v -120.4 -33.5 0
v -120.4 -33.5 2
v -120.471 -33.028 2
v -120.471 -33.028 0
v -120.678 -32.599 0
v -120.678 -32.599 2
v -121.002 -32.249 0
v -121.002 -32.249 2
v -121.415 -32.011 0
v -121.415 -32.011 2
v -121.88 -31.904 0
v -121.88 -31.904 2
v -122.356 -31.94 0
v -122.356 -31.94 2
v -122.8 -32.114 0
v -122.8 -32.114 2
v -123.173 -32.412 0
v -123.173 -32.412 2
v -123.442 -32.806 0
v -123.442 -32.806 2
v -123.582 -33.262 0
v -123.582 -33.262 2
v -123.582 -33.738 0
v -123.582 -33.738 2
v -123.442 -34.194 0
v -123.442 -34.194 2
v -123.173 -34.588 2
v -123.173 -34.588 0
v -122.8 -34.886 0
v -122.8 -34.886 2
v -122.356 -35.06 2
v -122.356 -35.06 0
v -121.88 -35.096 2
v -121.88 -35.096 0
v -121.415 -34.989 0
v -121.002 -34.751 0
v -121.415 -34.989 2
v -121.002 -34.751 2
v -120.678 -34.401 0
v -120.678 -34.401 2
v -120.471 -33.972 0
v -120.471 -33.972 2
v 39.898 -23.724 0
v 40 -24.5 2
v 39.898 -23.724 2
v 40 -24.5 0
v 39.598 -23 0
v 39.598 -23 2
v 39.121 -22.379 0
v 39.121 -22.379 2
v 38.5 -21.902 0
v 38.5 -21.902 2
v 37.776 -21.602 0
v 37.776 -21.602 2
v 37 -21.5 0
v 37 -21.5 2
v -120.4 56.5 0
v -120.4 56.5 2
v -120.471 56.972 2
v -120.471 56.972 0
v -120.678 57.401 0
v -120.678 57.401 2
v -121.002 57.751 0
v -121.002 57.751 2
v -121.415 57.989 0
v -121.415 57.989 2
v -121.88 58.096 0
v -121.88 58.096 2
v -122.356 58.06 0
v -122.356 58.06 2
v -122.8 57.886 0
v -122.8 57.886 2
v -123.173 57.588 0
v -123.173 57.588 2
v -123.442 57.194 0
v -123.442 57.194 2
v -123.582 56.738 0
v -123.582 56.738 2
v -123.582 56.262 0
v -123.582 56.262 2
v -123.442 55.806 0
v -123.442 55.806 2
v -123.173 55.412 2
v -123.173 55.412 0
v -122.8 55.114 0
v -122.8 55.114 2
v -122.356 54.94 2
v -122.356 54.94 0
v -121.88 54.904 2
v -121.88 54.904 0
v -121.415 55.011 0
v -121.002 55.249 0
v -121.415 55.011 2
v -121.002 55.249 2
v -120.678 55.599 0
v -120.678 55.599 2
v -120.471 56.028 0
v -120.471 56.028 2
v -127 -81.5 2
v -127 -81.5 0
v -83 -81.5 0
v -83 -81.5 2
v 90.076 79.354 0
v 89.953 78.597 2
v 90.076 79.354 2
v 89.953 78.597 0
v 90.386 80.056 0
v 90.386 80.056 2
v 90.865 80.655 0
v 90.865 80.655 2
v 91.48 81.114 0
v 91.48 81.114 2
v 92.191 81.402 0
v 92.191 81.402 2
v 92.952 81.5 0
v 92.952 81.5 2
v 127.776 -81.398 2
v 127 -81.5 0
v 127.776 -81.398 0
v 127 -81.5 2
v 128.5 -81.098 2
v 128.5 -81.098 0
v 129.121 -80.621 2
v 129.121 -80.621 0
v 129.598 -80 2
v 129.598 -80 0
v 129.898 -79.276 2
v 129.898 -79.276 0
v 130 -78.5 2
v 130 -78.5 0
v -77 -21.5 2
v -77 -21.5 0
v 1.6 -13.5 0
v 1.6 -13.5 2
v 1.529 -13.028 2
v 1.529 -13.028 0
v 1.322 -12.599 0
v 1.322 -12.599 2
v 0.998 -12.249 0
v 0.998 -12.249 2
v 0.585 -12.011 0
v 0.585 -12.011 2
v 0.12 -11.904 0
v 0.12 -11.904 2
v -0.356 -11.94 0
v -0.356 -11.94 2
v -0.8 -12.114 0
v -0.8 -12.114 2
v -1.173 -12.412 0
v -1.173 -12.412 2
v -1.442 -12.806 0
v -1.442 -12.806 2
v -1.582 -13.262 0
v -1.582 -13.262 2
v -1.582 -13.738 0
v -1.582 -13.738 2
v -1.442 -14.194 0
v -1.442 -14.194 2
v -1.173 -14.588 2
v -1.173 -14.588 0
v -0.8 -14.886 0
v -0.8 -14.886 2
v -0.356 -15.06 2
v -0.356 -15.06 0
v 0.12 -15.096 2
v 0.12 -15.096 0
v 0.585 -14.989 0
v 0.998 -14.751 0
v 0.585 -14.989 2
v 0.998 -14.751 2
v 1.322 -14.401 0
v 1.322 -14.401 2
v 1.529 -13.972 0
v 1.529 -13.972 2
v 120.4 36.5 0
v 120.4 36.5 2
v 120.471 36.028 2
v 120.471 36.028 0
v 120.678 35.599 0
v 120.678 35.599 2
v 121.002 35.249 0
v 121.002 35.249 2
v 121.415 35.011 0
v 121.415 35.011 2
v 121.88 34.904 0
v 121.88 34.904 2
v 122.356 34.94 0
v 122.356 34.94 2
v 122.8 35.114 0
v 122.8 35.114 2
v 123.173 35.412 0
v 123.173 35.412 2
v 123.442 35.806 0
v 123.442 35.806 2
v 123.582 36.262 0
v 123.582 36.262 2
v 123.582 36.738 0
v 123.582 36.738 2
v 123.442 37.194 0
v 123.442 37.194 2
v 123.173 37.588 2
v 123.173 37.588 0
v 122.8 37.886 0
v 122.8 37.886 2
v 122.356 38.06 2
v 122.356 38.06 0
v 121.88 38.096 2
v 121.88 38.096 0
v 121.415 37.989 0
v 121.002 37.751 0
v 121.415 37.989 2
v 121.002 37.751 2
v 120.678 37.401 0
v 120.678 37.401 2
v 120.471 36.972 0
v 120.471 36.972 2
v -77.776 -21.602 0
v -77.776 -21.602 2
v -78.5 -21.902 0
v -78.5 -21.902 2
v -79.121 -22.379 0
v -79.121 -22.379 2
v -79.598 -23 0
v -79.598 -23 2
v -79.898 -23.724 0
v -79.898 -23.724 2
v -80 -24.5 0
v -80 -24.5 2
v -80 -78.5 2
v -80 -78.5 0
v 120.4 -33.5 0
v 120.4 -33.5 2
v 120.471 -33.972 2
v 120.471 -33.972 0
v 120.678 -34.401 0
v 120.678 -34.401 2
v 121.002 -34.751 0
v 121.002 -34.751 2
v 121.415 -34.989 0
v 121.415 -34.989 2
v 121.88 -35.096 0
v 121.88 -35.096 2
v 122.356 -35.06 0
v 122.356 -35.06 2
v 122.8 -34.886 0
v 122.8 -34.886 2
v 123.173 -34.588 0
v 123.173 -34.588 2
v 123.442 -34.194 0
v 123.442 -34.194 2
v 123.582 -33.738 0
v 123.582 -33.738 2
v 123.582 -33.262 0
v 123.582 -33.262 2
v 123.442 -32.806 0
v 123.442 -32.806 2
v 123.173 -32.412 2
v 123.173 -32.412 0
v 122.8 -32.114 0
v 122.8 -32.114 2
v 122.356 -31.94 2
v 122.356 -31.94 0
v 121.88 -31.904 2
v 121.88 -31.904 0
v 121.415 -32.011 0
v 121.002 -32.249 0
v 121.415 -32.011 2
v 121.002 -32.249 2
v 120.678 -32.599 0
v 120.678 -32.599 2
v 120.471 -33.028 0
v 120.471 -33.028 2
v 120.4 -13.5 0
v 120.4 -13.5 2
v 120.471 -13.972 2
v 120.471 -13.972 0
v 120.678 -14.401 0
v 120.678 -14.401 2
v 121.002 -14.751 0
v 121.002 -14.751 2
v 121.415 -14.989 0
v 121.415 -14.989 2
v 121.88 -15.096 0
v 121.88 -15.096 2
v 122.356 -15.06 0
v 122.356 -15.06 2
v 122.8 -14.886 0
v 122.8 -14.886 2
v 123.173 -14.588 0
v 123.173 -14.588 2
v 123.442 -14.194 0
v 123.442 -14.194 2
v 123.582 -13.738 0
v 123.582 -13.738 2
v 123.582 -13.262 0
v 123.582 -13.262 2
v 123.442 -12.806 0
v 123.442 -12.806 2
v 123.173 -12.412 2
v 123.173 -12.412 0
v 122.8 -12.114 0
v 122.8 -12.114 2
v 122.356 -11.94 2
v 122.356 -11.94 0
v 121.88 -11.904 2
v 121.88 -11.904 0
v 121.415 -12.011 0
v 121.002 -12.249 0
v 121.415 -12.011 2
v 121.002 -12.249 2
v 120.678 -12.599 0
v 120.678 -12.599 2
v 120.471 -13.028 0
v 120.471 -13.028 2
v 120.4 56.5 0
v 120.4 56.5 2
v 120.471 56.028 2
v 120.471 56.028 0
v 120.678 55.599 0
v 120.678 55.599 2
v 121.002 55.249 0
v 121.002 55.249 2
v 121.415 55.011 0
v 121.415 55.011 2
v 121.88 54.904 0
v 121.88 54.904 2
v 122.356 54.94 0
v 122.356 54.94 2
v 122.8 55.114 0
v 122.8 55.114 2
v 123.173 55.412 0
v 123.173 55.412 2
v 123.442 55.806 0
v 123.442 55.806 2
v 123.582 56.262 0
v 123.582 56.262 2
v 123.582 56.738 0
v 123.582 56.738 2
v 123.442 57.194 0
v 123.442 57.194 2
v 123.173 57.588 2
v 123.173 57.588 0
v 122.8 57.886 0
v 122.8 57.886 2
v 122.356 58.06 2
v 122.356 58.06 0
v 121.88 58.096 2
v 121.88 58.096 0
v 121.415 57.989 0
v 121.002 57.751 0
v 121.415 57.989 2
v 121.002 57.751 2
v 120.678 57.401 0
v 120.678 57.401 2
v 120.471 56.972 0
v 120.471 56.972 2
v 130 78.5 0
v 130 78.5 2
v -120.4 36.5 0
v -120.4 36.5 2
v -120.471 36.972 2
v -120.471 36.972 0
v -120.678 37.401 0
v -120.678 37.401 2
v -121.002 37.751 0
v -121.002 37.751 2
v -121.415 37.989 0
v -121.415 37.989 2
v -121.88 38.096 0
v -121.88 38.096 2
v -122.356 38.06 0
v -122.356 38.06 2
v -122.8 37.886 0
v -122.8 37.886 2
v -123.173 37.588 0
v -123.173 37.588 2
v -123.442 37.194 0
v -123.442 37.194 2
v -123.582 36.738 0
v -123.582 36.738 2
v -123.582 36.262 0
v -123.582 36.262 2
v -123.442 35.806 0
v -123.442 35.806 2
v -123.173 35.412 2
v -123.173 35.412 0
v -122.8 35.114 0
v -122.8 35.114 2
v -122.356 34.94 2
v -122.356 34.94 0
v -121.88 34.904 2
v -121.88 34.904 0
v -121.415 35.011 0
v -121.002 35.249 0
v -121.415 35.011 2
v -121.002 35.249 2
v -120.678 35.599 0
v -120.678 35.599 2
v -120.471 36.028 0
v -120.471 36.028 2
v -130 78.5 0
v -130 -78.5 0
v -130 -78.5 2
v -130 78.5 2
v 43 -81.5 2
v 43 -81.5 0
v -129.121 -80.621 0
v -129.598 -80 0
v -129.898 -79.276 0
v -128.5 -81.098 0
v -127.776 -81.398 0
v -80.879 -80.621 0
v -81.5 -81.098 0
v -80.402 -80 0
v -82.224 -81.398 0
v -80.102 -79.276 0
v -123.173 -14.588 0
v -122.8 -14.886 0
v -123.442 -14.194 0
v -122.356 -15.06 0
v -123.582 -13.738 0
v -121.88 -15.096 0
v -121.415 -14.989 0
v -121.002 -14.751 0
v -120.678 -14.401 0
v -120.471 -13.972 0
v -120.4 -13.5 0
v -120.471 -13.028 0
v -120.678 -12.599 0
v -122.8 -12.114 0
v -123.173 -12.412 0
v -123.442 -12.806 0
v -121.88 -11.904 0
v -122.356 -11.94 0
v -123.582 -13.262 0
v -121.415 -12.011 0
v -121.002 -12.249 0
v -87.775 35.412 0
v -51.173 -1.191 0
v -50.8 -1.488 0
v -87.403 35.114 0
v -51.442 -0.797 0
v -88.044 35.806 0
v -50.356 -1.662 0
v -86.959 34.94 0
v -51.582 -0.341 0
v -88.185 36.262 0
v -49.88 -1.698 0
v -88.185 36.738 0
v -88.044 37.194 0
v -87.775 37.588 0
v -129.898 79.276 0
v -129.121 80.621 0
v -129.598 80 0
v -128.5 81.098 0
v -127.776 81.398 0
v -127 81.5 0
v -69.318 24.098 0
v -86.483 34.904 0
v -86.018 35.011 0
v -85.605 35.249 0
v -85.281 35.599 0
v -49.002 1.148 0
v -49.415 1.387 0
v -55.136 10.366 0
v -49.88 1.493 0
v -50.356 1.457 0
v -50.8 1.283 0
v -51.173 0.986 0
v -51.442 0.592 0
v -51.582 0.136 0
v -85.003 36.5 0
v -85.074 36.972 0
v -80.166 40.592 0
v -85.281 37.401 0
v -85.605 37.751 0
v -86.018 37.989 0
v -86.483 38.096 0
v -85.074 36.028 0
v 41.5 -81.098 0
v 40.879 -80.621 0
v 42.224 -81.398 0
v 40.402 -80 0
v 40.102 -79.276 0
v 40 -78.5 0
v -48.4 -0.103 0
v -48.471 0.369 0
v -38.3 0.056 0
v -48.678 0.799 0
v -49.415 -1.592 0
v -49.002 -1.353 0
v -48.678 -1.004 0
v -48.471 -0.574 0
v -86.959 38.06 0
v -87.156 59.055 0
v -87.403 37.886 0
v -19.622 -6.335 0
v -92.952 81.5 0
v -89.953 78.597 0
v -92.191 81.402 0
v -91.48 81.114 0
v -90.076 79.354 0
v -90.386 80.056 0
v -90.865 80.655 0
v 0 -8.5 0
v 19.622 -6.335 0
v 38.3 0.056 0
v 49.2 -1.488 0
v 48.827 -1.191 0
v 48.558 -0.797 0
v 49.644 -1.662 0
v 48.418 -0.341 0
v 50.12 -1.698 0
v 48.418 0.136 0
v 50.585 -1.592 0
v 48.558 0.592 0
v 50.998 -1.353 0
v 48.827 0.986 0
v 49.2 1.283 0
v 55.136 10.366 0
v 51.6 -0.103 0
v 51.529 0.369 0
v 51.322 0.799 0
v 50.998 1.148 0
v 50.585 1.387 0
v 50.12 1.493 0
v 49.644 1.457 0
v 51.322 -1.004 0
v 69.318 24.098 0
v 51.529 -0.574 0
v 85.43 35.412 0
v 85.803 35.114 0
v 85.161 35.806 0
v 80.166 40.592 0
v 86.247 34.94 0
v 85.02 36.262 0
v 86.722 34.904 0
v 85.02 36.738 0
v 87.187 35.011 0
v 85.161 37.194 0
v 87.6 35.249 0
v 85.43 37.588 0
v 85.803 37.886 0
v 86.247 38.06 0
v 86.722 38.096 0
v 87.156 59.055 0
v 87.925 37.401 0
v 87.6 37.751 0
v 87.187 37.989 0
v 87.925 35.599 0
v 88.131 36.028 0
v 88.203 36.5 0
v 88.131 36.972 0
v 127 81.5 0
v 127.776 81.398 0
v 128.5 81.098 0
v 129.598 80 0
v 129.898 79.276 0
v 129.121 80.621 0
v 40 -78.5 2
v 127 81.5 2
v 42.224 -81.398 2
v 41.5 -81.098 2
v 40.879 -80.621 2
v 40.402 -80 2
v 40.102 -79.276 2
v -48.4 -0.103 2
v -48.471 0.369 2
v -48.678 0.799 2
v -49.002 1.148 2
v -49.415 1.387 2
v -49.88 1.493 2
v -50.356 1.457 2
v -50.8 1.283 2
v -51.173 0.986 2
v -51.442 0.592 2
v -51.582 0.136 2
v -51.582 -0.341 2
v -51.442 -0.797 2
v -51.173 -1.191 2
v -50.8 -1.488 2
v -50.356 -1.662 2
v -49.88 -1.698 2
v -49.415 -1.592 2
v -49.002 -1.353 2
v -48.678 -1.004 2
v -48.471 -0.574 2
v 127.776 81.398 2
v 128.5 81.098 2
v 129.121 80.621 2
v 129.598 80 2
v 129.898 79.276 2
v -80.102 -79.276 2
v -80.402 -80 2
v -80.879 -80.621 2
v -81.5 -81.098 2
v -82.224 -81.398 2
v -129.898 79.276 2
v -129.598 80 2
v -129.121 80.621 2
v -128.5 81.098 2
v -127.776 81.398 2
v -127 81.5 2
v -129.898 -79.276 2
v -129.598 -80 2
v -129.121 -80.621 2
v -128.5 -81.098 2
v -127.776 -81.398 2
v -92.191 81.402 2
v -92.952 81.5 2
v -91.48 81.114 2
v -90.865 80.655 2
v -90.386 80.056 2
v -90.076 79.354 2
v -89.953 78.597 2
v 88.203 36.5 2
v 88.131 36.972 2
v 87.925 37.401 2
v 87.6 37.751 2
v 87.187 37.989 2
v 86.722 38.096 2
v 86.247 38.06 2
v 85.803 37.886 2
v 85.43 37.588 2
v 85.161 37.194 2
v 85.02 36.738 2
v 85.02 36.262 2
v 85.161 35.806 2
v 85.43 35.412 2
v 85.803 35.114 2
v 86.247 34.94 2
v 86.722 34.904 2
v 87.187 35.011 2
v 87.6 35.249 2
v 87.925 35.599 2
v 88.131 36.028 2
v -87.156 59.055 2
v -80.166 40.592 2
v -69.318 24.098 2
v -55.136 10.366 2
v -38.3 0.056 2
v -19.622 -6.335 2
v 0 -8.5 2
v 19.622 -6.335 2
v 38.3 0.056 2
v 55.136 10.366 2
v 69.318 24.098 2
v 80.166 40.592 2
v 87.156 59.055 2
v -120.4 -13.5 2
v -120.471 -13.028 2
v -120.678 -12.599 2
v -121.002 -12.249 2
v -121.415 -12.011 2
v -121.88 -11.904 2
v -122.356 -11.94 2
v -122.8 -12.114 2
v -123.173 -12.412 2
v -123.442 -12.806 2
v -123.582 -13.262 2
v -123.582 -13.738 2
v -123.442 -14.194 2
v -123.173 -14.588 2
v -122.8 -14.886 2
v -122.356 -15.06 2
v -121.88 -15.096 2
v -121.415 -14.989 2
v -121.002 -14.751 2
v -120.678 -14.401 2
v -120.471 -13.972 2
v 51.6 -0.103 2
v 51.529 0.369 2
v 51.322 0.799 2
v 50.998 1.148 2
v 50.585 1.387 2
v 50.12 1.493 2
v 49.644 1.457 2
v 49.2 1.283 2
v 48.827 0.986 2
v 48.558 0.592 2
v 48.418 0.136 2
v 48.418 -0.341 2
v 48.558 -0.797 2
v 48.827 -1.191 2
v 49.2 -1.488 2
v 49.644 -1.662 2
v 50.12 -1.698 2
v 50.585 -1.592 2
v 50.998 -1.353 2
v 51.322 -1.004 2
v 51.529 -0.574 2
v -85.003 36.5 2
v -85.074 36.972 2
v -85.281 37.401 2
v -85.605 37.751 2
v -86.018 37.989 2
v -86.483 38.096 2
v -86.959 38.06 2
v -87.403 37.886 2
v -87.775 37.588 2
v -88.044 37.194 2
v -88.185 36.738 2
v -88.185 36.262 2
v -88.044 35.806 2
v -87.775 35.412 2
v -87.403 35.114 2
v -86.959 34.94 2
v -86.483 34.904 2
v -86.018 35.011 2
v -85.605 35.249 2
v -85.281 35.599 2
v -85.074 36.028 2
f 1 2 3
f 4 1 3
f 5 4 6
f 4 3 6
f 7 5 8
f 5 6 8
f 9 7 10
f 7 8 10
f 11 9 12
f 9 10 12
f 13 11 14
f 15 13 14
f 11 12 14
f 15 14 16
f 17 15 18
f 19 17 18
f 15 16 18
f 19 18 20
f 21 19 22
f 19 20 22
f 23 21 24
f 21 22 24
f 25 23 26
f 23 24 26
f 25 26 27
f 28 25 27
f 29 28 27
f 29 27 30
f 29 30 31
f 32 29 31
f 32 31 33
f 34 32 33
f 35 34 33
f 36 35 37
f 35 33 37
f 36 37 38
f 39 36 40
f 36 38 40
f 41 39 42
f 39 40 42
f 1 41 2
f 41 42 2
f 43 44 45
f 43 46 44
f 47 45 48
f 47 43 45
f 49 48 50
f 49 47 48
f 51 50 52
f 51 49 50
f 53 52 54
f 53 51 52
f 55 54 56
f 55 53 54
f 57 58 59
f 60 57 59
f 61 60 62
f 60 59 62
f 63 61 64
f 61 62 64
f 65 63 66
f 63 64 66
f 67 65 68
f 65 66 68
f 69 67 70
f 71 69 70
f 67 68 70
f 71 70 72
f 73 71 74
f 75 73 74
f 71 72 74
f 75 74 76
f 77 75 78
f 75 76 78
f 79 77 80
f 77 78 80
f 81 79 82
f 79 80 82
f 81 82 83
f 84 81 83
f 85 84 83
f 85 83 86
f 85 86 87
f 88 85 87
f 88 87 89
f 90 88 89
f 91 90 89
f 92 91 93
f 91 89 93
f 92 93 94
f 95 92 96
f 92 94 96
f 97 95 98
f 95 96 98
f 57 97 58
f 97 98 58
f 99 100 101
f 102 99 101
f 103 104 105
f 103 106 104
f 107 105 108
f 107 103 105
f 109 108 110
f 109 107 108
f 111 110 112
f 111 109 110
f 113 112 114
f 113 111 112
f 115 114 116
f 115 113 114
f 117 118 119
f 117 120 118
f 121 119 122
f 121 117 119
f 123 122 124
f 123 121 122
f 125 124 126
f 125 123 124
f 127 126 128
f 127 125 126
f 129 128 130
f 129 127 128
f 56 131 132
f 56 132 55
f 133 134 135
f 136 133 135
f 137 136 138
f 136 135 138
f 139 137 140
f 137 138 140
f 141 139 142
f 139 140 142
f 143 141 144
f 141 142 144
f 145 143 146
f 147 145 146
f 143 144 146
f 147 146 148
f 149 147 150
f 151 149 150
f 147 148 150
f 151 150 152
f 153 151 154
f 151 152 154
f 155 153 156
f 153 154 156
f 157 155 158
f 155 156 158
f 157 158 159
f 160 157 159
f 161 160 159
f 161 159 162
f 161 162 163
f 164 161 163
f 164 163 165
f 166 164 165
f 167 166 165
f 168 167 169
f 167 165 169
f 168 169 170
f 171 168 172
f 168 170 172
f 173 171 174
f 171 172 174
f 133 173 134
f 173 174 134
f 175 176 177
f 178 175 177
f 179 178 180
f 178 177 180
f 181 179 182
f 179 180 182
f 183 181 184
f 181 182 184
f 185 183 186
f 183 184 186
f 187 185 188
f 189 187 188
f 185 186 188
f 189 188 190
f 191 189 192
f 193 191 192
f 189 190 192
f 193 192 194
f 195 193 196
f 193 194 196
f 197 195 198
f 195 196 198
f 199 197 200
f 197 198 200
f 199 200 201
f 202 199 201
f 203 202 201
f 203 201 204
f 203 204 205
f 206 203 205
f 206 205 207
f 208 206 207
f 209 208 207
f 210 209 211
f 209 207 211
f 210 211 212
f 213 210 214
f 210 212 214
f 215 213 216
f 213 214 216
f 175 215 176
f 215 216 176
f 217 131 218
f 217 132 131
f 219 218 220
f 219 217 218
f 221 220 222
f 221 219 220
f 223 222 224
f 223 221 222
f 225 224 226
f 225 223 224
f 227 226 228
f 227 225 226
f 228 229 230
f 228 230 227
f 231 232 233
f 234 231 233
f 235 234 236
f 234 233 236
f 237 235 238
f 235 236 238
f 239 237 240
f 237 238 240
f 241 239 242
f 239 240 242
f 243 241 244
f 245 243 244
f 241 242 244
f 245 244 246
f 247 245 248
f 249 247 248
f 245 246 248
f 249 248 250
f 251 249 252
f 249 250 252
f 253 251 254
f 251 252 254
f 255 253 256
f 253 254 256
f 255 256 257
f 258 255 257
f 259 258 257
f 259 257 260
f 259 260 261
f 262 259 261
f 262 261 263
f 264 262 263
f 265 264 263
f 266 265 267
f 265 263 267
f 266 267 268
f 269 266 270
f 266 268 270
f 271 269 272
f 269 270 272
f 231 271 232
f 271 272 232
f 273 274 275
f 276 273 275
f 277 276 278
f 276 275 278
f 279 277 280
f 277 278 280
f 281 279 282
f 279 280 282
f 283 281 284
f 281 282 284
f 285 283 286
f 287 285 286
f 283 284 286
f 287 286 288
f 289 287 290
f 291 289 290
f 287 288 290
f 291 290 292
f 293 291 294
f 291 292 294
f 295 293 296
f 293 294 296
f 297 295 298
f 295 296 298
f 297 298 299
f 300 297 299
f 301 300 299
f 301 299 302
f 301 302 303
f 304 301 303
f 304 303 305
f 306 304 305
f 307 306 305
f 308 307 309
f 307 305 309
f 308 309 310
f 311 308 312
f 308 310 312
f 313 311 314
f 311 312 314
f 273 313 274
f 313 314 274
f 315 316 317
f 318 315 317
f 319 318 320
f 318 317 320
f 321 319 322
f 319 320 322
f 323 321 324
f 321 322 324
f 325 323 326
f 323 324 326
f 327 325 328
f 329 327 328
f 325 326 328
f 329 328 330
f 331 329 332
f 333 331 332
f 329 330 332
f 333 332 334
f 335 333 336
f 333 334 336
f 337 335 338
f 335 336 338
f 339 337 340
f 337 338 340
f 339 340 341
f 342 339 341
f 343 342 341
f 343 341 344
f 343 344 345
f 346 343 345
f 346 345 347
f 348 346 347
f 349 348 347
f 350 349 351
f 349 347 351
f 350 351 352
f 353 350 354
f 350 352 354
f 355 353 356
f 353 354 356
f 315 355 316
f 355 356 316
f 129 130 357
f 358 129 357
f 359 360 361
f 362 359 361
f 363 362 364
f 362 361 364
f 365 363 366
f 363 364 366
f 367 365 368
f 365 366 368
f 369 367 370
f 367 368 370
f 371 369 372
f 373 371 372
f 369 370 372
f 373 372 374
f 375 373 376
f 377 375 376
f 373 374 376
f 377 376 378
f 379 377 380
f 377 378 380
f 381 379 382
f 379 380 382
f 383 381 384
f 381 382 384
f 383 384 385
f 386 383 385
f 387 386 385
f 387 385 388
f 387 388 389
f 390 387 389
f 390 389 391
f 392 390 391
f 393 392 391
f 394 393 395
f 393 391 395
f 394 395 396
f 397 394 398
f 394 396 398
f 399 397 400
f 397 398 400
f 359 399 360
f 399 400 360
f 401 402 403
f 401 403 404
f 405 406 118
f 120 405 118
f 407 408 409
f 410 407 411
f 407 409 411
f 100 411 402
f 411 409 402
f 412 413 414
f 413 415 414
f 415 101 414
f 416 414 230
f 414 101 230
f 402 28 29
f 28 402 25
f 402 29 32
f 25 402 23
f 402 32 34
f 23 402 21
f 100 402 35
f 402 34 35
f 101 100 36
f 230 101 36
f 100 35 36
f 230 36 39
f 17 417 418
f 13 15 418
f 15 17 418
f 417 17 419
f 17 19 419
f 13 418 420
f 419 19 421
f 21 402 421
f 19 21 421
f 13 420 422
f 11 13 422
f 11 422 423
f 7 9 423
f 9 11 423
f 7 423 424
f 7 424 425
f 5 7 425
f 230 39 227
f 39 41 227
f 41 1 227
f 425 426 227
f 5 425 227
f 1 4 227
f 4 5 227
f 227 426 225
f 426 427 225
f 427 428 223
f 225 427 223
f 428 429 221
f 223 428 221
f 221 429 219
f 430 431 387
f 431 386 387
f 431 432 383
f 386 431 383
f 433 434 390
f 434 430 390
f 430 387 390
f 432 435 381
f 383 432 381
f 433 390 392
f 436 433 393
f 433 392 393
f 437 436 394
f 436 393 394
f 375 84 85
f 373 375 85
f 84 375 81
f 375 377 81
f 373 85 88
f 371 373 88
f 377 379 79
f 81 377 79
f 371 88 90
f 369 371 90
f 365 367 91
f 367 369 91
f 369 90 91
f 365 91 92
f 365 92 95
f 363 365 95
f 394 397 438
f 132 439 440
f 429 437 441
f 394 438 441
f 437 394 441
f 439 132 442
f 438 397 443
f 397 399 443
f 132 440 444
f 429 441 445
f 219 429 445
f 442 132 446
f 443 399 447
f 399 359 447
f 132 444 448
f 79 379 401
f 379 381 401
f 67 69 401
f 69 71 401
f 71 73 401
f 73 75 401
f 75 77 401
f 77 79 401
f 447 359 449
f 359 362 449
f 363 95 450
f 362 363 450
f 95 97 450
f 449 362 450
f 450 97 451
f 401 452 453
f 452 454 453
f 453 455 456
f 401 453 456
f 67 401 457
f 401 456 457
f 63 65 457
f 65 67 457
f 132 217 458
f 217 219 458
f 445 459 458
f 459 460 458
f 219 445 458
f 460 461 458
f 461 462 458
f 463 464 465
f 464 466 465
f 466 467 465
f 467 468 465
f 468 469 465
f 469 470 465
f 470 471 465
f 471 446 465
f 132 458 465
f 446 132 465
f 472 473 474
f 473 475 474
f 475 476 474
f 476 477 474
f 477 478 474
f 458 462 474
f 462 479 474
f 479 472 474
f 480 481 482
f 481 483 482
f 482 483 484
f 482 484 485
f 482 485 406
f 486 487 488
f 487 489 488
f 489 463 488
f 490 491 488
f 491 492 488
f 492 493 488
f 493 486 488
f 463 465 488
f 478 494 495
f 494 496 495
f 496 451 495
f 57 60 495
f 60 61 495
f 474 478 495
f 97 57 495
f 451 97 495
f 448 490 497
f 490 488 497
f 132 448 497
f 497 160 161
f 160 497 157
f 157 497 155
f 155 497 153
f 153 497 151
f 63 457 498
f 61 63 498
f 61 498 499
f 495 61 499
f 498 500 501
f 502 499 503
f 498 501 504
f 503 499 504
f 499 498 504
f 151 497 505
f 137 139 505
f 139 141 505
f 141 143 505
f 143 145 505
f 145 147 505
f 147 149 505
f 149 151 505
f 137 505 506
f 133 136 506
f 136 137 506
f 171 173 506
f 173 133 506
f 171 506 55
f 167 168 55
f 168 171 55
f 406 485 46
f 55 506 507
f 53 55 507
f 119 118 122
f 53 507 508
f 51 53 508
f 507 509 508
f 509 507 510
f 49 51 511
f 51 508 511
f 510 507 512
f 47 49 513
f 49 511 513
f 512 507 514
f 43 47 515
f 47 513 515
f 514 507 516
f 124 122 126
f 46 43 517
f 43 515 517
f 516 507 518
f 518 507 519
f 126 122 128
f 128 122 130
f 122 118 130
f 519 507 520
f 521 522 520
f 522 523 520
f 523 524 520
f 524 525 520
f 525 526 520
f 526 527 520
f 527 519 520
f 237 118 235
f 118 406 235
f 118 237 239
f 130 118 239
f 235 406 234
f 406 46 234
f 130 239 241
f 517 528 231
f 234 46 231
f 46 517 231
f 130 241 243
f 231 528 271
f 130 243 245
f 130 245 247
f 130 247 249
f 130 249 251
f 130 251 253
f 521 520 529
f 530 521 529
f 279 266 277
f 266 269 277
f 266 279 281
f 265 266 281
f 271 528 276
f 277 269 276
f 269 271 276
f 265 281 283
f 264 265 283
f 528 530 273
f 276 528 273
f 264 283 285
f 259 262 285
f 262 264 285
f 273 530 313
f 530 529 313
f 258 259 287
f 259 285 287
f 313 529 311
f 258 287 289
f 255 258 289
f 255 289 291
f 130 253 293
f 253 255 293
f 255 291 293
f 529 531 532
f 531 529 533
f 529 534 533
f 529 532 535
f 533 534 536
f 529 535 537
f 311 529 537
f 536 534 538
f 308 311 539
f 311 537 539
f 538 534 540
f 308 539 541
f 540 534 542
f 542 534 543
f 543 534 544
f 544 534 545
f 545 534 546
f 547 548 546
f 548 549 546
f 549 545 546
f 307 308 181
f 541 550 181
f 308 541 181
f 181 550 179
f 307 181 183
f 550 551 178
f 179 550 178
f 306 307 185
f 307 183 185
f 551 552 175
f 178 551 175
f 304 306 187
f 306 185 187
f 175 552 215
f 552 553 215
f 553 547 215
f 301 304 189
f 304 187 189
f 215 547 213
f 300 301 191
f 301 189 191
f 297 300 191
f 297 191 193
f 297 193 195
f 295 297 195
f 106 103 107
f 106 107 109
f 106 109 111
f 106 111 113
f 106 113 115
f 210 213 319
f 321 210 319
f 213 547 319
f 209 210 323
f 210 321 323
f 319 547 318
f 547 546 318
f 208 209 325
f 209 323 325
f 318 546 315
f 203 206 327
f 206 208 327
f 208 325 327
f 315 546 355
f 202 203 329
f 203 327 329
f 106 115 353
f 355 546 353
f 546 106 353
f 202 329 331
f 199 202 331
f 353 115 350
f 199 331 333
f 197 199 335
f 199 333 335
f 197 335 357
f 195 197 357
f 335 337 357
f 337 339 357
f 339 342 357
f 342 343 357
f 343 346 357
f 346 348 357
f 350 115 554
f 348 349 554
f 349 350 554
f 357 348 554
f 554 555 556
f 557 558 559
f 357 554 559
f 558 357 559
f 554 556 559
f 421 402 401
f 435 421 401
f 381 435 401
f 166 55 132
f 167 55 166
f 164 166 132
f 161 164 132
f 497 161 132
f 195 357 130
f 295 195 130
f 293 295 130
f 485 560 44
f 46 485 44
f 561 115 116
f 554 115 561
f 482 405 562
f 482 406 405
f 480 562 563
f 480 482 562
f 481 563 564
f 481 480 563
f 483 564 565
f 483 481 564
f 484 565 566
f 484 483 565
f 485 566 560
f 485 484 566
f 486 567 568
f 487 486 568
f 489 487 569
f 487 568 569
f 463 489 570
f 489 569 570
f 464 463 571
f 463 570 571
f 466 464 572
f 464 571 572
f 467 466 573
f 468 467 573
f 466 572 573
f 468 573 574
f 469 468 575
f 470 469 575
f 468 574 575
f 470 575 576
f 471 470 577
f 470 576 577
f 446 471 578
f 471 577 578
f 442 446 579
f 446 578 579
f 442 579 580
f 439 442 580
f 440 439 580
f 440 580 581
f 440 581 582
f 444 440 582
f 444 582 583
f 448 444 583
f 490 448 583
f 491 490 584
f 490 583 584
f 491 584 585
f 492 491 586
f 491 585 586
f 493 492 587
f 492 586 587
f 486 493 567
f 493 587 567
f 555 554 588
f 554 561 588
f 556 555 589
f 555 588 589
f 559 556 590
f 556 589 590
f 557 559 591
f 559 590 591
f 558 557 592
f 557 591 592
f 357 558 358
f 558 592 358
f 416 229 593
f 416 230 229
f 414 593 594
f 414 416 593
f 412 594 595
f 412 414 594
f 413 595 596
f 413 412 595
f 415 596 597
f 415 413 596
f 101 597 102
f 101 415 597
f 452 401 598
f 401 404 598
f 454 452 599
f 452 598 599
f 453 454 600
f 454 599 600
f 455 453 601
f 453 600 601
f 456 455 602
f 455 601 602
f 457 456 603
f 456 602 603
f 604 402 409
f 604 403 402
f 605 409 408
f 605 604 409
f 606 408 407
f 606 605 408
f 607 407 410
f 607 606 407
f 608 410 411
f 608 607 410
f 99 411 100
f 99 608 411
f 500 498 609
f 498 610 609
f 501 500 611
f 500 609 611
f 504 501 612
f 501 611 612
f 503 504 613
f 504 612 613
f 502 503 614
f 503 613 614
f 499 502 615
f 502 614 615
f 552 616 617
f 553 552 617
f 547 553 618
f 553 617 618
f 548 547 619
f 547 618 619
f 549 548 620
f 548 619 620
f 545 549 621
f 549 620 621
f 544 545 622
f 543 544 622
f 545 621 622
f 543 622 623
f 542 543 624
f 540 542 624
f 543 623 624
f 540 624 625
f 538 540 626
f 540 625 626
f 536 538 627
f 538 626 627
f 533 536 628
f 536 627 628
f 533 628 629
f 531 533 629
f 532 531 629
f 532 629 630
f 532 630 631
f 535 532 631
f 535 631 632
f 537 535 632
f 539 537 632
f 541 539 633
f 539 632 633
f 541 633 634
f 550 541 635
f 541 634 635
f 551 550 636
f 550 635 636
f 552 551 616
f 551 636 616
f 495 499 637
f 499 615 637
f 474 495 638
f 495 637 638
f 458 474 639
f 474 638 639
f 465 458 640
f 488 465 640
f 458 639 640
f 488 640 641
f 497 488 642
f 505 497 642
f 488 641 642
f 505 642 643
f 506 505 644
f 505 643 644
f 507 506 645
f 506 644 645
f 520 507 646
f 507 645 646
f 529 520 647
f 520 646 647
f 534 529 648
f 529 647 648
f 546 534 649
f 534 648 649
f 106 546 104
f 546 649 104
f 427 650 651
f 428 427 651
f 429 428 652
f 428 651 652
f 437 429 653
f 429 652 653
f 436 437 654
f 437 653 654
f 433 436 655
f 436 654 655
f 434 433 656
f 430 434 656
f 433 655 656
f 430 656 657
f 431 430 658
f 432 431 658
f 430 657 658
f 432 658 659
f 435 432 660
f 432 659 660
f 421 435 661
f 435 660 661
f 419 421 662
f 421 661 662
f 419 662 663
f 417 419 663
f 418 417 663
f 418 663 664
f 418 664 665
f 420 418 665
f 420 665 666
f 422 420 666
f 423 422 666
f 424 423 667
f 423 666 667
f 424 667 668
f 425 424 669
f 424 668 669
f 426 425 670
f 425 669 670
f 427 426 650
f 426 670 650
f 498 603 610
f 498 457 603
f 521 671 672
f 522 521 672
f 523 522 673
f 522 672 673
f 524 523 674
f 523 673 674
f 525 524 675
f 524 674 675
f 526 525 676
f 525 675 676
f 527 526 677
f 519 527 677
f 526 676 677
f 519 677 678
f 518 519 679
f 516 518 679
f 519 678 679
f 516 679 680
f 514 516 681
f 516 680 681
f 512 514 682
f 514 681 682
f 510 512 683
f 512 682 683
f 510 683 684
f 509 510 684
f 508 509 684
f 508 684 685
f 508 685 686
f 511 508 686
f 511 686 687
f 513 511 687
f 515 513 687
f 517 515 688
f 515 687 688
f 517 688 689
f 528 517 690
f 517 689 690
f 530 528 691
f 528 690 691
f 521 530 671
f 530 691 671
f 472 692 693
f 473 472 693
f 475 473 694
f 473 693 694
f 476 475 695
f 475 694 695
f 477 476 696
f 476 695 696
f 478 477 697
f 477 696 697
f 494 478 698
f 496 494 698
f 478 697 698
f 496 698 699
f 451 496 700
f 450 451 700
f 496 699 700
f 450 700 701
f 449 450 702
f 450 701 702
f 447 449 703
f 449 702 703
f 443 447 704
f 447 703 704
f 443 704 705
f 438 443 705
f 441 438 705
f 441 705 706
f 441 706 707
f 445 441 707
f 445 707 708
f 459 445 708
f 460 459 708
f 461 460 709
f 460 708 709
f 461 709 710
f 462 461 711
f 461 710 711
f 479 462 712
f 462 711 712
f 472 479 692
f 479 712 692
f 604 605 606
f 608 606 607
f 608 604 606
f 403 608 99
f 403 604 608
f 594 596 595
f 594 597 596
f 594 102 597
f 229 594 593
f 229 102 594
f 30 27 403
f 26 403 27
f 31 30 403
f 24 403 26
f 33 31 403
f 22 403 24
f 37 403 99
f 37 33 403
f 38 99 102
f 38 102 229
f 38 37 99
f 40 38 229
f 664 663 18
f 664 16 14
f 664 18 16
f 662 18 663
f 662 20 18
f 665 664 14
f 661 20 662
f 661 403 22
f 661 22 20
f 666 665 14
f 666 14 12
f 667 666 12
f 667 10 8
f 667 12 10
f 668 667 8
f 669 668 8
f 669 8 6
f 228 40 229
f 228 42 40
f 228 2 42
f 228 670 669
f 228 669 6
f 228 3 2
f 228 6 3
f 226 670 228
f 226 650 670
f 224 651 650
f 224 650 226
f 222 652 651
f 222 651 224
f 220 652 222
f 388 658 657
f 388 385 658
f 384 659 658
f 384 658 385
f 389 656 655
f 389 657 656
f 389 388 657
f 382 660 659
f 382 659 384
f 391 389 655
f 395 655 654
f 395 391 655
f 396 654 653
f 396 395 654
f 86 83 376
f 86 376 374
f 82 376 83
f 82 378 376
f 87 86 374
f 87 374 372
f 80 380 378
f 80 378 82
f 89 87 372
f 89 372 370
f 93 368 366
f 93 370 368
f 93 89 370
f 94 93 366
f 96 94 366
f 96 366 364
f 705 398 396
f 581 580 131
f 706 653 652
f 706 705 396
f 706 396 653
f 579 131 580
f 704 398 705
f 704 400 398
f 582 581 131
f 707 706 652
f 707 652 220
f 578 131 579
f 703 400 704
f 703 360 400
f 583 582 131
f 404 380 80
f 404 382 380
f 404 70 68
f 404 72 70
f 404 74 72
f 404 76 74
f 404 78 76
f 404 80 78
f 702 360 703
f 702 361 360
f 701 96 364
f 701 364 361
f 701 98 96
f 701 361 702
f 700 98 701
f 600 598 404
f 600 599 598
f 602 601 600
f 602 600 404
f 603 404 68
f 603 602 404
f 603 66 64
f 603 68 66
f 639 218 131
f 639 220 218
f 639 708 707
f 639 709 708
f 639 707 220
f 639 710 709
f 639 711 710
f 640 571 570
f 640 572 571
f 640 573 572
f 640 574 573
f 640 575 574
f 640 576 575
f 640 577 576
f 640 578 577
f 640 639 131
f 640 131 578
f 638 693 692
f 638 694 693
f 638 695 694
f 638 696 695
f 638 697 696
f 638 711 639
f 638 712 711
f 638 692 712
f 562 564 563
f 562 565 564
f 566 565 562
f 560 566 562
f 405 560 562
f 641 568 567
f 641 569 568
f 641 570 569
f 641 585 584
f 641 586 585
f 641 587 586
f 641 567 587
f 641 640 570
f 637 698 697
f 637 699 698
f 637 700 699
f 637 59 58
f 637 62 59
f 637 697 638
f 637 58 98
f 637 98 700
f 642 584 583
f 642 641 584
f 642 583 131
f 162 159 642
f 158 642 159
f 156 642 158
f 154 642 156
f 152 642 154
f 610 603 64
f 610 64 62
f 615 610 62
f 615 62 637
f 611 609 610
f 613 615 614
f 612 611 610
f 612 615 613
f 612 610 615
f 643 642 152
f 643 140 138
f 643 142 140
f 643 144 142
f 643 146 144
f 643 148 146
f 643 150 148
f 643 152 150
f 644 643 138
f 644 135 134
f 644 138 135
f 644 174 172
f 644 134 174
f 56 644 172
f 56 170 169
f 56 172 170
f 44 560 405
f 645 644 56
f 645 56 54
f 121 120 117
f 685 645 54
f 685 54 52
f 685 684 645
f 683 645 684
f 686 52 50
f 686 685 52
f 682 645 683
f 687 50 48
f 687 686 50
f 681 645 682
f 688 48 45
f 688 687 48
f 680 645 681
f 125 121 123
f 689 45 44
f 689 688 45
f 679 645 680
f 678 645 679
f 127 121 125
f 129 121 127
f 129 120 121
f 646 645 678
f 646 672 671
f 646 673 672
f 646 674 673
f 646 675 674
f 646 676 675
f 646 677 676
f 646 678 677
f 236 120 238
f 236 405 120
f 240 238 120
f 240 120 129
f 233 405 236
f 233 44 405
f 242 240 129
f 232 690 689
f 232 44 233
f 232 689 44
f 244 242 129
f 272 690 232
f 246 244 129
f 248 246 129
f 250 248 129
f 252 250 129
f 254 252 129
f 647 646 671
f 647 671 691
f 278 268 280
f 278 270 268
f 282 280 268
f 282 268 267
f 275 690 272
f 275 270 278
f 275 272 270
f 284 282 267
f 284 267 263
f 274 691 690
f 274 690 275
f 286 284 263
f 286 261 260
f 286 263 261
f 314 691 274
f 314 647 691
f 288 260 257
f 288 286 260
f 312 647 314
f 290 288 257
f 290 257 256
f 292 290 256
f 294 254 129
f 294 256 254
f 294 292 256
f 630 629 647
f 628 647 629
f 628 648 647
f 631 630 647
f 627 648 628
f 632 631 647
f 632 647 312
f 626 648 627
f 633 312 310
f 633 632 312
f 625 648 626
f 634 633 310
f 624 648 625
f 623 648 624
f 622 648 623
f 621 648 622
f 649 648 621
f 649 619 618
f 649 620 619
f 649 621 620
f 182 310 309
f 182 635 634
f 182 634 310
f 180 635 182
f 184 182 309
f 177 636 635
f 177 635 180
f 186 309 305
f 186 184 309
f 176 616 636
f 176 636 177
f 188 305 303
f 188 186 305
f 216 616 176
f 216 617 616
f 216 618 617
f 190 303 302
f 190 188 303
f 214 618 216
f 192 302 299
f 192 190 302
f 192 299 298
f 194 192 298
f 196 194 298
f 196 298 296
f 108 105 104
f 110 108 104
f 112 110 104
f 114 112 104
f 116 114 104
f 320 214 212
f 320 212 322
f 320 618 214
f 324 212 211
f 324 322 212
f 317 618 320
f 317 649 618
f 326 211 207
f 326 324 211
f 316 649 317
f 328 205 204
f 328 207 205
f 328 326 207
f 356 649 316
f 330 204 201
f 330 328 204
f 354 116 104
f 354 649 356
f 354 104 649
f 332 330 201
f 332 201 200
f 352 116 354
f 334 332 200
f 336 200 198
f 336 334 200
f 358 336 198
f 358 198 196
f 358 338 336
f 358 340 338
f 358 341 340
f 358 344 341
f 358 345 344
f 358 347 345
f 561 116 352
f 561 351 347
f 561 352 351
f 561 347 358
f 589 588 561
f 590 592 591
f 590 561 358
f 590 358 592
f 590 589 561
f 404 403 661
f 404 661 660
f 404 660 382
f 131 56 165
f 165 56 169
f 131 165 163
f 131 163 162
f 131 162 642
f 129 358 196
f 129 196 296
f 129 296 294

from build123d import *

# Parameters (mm, degrees)
SKETCH_1_W          = 260
SKETCH_1_H          = 163
EXTRUDE_1_DEPTH     = 2
SKETCH_2_R          = 1.6
CUT_EXTRUDE_1_DEPTH = 2
FILLET_1_R          = 3
SKETCH_3_R          = 90
SKETCH_3_R_2        = 1.6
CUT_EXTRUDE_2_DEPTH = 2
SKETCH_4_W          = 120
SKETCH_4_H          = 60
CUT_EXTRUDE_3_DEPTH = 2
FILLET_2_R          = 3


with BuildPart() as part:
    # 草图1 → 凸台-拉伸1 (new body)
    with BuildSketch(Plane.XY):
        Rectangle(SKETCH_1_W, SKETCH_1_H)
    extrude(amount=EXTRUDE_1_DEPTH)

    # 草图2 → 切除-拉伸1 (cut)
    with BuildSketch(Plane.XY.offset(2)):
        with Locations((-122, -33.5)):
            Circle(SKETCH_2_R)
        with Locations((-122, -13.5)):
            Circle(SKETCH_2_R)
        with Locations((-122, 36.5)):
            Circle(SKETCH_2_R)
        with Locations((-122, 56.5)):
            Circle(SKETCH_2_R)
        with Locations(Location((122, 56.5, 0), (0, 0, 180))):
            Circle(SKETCH_2_R)
        with Locations(Location((122, 36.5, 0), (0, 0, 180))):
            Circle(SKETCH_2_R)
        with Locations(Location((122, -13.5, 0), (0, 0, 180))):
            Circle(SKETCH_2_R)
        with Locations(Location((122, -33.5, 0), (0, 0, 180))):
            Circle(SKETCH_2_R)
    extrude(amount=-CUT_EXTRUDE_1_DEPTH, mode=Mode.SUBTRACT)

    # 圆角1
    fillet_1_edges = [part.edges().sort_by_distance(p)[0] for p in [
        (-130, 81.5, 1),
        (130, 81.5, 1),
        (130, -81.5, 1),
        (-130, -81.5, 1),
    ]]
    fillet(fillet_1_edges, radius=FILLET_1_R)

    # 草图3 → 切除-拉伸2 (cut)
    with BuildSketch(Plane.XY.offset(2)):
        with Locations((0, 81.5)):
            Circle(SKETCH_3_R)
        with Locations((0, -13.5)):
            Circle(SKETCH_3_R_2)
        with Locations((-50, -0.102540378)):
            Circle(SKETCH_3_R_2)
        with Locations((-86.602540378, 36.5)):
            Circle(SKETCH_3_R_2)
        with Locations((86.602540378, 36.5)):
            Circle(SKETCH_3_R_2)
        with Locations((50, -0.102540378)):
            Circle(SKETCH_3_R_2)
    extrude(amount=-CUT_EXTRUDE_2_DEPTH, mode=Mode.SUBTRACT)

    # 草图4 → 切除-拉伸3 (cut)
    with BuildSketch(Plane.XY.offset(2)):
        with Locations((-20, -51.5)):
            Rectangle(SKETCH_4_W, SKETCH_4_H)
    extrude(amount=-CUT_EXTRUDE_3_DEPTH, mode=Mode.SUBTRACT)

    # 圆角2
    fillet_2_edges = [part.edges().sort_by_distance(p)[0] for p in [
        (-80, -81.5, 1),
        (-80, -21.5, 1),
        (40, -21.5, 1),
        (40, -81.5, 1),
        (90, 81.5, 1),
        (-90, 81.5, 1),
    ]]
    fillet(fillet_2_edges, radius=FILLET_2_R)


solid = part.part
